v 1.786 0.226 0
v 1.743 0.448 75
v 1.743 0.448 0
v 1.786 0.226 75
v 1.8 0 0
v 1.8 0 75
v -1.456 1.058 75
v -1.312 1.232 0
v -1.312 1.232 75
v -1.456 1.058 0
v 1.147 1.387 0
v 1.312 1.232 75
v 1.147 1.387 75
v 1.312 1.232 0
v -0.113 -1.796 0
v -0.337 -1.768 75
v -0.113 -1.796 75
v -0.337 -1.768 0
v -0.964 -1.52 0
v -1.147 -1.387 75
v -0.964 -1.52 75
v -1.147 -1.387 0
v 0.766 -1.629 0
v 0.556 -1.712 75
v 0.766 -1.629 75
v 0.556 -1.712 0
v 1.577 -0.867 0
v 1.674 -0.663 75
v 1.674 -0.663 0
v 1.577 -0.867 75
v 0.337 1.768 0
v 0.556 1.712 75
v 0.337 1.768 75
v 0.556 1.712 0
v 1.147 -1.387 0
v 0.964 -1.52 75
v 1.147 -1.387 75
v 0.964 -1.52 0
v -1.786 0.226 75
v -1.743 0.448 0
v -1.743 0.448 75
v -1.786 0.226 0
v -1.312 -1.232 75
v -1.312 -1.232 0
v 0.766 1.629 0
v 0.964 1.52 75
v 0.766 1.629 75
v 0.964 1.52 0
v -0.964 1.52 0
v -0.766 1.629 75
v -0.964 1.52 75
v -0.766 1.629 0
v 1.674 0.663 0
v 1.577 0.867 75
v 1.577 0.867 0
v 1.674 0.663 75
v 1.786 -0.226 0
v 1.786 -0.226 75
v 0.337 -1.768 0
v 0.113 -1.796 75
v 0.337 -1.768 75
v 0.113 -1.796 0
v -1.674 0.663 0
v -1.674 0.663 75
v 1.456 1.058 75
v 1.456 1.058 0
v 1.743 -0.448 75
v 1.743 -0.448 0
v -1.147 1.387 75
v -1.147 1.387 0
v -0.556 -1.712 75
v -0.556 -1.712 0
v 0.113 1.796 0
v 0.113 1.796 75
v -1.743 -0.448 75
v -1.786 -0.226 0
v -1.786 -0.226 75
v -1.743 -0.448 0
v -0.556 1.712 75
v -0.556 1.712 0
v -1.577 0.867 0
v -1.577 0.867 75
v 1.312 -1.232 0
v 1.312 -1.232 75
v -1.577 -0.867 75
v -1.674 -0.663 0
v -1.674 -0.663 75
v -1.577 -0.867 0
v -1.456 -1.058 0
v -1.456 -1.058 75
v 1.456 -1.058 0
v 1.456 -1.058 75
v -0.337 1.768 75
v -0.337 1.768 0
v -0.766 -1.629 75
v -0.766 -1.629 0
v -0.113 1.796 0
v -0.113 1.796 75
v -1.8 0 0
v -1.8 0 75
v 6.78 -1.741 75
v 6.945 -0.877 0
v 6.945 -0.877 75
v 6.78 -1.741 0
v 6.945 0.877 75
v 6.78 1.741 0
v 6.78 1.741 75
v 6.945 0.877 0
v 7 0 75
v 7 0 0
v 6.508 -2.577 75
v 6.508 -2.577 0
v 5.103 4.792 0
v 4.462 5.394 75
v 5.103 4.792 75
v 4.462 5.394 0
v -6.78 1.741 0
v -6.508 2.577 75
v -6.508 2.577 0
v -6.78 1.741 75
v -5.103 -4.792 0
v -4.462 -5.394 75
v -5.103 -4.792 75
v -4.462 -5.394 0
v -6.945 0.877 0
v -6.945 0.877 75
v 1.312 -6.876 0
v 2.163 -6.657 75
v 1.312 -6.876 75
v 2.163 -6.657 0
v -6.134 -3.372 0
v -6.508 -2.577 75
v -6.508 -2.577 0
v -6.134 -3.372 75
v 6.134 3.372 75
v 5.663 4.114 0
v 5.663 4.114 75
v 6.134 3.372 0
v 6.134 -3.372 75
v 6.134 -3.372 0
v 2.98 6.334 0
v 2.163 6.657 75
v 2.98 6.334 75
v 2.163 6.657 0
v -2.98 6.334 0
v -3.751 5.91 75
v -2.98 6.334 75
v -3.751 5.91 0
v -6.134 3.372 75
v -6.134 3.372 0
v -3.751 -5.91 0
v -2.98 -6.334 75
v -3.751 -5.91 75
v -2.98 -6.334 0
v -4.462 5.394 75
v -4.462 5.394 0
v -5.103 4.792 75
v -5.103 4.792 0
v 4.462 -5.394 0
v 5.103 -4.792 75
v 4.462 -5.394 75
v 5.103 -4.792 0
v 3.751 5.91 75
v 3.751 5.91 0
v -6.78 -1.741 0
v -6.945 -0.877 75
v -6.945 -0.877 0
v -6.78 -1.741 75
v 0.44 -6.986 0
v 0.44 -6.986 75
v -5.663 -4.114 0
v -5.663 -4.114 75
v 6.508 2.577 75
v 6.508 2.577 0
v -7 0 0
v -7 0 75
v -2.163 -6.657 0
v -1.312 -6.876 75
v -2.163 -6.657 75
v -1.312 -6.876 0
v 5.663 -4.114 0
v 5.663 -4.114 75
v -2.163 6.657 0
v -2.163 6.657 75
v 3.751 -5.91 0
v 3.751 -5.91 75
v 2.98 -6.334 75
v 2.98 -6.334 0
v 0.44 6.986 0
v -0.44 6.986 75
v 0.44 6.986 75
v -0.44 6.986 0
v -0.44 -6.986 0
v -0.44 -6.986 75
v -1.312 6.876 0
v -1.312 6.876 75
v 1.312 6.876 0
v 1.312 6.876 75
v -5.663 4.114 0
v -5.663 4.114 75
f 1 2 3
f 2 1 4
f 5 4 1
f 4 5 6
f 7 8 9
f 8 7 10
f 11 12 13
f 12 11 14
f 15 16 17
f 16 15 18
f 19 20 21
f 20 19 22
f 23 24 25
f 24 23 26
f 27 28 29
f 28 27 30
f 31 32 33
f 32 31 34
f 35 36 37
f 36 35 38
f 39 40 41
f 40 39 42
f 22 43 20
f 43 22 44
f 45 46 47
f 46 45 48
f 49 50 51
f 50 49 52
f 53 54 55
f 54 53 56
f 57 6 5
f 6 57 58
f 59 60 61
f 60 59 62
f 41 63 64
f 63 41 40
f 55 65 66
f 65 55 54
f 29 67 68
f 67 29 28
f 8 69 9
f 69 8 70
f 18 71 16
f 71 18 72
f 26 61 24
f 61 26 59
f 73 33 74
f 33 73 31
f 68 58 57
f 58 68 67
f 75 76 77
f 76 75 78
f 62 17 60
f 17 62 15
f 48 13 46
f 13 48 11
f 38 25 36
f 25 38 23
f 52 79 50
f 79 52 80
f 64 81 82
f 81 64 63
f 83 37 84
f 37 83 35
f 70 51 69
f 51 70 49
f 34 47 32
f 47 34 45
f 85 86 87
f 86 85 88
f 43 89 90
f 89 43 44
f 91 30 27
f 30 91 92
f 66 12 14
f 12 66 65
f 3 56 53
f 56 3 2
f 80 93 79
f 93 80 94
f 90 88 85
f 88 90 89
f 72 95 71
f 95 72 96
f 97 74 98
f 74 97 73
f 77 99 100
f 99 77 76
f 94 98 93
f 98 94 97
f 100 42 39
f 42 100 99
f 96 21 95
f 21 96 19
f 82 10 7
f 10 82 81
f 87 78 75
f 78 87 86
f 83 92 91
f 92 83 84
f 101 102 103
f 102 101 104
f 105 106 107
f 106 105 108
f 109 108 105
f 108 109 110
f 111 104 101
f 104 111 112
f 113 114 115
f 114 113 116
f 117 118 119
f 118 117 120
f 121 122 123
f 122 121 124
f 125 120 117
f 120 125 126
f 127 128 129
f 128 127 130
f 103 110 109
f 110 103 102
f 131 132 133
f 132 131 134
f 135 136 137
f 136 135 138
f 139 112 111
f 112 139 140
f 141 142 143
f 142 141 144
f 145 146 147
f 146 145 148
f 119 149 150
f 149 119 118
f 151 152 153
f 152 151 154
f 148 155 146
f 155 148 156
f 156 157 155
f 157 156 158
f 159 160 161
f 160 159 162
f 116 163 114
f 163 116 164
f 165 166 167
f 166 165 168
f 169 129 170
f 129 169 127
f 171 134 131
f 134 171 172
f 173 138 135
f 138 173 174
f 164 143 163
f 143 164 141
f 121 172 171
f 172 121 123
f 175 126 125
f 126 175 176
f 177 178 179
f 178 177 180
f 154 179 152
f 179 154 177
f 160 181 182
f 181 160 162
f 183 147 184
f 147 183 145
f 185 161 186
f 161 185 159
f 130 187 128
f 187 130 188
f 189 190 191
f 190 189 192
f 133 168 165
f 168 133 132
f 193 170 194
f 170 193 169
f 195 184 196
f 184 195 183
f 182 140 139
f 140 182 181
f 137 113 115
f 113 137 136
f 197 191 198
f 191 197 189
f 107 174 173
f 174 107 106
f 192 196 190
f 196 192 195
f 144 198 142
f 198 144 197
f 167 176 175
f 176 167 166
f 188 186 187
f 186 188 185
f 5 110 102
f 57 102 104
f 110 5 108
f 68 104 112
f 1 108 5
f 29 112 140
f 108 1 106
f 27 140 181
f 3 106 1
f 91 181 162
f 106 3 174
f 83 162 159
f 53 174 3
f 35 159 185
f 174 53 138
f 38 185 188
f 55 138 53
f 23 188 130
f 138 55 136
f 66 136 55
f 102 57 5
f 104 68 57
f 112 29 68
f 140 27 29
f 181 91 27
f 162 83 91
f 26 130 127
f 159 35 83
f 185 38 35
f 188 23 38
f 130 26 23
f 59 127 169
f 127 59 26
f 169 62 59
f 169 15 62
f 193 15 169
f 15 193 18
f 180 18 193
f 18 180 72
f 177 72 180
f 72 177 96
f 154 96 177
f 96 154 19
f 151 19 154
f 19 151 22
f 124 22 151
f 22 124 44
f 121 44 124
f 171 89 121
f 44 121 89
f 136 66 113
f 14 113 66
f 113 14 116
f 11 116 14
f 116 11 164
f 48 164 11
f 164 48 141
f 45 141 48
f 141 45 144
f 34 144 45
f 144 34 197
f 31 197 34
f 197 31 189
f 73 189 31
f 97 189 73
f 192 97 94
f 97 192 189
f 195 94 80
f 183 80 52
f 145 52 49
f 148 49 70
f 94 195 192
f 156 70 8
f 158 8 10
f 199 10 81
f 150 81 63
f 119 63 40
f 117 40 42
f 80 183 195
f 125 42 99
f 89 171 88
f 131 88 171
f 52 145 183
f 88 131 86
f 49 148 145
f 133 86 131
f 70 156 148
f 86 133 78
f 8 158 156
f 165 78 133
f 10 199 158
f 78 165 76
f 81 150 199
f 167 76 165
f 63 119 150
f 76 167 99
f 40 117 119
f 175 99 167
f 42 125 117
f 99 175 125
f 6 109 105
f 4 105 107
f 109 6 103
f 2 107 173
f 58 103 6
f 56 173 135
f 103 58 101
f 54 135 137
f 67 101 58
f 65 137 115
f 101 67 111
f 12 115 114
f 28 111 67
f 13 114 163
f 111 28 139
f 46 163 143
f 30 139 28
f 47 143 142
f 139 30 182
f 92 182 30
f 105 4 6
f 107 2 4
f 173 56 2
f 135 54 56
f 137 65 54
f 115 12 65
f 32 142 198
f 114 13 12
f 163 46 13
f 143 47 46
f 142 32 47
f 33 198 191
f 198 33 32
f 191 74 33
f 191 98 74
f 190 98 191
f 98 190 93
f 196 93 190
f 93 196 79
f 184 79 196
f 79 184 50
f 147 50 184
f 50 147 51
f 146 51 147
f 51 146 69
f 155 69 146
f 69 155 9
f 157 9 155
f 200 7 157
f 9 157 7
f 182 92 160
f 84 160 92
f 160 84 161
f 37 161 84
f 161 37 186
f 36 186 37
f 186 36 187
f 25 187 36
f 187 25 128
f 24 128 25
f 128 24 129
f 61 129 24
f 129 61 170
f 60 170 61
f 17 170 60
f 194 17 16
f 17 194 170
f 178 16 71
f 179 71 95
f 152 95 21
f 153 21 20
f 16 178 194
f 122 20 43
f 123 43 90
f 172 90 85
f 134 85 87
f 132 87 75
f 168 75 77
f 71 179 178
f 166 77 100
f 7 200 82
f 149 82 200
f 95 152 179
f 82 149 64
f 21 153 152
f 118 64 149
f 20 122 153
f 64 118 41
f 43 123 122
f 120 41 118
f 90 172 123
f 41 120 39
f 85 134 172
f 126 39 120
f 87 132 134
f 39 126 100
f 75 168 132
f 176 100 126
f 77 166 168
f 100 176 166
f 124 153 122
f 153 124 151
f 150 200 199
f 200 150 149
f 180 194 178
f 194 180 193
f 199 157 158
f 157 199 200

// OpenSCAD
$fn = 50;


difference() {
	union() {
		cylinder(h = 75, r = 7.0000000000);
	}
	union() {
		translate(v = [0.0000000000, 0.0000000000, -100.0000000000]) {
			cylinder(h = 200, r = 1.8000000000);
		}
		cylinder(h = 75, r = 1.8000000000);
		cylinder(h = 75, r = 1.8000000000);
		cylinder(h = 75, r = 1.8000000000);
	}
}
